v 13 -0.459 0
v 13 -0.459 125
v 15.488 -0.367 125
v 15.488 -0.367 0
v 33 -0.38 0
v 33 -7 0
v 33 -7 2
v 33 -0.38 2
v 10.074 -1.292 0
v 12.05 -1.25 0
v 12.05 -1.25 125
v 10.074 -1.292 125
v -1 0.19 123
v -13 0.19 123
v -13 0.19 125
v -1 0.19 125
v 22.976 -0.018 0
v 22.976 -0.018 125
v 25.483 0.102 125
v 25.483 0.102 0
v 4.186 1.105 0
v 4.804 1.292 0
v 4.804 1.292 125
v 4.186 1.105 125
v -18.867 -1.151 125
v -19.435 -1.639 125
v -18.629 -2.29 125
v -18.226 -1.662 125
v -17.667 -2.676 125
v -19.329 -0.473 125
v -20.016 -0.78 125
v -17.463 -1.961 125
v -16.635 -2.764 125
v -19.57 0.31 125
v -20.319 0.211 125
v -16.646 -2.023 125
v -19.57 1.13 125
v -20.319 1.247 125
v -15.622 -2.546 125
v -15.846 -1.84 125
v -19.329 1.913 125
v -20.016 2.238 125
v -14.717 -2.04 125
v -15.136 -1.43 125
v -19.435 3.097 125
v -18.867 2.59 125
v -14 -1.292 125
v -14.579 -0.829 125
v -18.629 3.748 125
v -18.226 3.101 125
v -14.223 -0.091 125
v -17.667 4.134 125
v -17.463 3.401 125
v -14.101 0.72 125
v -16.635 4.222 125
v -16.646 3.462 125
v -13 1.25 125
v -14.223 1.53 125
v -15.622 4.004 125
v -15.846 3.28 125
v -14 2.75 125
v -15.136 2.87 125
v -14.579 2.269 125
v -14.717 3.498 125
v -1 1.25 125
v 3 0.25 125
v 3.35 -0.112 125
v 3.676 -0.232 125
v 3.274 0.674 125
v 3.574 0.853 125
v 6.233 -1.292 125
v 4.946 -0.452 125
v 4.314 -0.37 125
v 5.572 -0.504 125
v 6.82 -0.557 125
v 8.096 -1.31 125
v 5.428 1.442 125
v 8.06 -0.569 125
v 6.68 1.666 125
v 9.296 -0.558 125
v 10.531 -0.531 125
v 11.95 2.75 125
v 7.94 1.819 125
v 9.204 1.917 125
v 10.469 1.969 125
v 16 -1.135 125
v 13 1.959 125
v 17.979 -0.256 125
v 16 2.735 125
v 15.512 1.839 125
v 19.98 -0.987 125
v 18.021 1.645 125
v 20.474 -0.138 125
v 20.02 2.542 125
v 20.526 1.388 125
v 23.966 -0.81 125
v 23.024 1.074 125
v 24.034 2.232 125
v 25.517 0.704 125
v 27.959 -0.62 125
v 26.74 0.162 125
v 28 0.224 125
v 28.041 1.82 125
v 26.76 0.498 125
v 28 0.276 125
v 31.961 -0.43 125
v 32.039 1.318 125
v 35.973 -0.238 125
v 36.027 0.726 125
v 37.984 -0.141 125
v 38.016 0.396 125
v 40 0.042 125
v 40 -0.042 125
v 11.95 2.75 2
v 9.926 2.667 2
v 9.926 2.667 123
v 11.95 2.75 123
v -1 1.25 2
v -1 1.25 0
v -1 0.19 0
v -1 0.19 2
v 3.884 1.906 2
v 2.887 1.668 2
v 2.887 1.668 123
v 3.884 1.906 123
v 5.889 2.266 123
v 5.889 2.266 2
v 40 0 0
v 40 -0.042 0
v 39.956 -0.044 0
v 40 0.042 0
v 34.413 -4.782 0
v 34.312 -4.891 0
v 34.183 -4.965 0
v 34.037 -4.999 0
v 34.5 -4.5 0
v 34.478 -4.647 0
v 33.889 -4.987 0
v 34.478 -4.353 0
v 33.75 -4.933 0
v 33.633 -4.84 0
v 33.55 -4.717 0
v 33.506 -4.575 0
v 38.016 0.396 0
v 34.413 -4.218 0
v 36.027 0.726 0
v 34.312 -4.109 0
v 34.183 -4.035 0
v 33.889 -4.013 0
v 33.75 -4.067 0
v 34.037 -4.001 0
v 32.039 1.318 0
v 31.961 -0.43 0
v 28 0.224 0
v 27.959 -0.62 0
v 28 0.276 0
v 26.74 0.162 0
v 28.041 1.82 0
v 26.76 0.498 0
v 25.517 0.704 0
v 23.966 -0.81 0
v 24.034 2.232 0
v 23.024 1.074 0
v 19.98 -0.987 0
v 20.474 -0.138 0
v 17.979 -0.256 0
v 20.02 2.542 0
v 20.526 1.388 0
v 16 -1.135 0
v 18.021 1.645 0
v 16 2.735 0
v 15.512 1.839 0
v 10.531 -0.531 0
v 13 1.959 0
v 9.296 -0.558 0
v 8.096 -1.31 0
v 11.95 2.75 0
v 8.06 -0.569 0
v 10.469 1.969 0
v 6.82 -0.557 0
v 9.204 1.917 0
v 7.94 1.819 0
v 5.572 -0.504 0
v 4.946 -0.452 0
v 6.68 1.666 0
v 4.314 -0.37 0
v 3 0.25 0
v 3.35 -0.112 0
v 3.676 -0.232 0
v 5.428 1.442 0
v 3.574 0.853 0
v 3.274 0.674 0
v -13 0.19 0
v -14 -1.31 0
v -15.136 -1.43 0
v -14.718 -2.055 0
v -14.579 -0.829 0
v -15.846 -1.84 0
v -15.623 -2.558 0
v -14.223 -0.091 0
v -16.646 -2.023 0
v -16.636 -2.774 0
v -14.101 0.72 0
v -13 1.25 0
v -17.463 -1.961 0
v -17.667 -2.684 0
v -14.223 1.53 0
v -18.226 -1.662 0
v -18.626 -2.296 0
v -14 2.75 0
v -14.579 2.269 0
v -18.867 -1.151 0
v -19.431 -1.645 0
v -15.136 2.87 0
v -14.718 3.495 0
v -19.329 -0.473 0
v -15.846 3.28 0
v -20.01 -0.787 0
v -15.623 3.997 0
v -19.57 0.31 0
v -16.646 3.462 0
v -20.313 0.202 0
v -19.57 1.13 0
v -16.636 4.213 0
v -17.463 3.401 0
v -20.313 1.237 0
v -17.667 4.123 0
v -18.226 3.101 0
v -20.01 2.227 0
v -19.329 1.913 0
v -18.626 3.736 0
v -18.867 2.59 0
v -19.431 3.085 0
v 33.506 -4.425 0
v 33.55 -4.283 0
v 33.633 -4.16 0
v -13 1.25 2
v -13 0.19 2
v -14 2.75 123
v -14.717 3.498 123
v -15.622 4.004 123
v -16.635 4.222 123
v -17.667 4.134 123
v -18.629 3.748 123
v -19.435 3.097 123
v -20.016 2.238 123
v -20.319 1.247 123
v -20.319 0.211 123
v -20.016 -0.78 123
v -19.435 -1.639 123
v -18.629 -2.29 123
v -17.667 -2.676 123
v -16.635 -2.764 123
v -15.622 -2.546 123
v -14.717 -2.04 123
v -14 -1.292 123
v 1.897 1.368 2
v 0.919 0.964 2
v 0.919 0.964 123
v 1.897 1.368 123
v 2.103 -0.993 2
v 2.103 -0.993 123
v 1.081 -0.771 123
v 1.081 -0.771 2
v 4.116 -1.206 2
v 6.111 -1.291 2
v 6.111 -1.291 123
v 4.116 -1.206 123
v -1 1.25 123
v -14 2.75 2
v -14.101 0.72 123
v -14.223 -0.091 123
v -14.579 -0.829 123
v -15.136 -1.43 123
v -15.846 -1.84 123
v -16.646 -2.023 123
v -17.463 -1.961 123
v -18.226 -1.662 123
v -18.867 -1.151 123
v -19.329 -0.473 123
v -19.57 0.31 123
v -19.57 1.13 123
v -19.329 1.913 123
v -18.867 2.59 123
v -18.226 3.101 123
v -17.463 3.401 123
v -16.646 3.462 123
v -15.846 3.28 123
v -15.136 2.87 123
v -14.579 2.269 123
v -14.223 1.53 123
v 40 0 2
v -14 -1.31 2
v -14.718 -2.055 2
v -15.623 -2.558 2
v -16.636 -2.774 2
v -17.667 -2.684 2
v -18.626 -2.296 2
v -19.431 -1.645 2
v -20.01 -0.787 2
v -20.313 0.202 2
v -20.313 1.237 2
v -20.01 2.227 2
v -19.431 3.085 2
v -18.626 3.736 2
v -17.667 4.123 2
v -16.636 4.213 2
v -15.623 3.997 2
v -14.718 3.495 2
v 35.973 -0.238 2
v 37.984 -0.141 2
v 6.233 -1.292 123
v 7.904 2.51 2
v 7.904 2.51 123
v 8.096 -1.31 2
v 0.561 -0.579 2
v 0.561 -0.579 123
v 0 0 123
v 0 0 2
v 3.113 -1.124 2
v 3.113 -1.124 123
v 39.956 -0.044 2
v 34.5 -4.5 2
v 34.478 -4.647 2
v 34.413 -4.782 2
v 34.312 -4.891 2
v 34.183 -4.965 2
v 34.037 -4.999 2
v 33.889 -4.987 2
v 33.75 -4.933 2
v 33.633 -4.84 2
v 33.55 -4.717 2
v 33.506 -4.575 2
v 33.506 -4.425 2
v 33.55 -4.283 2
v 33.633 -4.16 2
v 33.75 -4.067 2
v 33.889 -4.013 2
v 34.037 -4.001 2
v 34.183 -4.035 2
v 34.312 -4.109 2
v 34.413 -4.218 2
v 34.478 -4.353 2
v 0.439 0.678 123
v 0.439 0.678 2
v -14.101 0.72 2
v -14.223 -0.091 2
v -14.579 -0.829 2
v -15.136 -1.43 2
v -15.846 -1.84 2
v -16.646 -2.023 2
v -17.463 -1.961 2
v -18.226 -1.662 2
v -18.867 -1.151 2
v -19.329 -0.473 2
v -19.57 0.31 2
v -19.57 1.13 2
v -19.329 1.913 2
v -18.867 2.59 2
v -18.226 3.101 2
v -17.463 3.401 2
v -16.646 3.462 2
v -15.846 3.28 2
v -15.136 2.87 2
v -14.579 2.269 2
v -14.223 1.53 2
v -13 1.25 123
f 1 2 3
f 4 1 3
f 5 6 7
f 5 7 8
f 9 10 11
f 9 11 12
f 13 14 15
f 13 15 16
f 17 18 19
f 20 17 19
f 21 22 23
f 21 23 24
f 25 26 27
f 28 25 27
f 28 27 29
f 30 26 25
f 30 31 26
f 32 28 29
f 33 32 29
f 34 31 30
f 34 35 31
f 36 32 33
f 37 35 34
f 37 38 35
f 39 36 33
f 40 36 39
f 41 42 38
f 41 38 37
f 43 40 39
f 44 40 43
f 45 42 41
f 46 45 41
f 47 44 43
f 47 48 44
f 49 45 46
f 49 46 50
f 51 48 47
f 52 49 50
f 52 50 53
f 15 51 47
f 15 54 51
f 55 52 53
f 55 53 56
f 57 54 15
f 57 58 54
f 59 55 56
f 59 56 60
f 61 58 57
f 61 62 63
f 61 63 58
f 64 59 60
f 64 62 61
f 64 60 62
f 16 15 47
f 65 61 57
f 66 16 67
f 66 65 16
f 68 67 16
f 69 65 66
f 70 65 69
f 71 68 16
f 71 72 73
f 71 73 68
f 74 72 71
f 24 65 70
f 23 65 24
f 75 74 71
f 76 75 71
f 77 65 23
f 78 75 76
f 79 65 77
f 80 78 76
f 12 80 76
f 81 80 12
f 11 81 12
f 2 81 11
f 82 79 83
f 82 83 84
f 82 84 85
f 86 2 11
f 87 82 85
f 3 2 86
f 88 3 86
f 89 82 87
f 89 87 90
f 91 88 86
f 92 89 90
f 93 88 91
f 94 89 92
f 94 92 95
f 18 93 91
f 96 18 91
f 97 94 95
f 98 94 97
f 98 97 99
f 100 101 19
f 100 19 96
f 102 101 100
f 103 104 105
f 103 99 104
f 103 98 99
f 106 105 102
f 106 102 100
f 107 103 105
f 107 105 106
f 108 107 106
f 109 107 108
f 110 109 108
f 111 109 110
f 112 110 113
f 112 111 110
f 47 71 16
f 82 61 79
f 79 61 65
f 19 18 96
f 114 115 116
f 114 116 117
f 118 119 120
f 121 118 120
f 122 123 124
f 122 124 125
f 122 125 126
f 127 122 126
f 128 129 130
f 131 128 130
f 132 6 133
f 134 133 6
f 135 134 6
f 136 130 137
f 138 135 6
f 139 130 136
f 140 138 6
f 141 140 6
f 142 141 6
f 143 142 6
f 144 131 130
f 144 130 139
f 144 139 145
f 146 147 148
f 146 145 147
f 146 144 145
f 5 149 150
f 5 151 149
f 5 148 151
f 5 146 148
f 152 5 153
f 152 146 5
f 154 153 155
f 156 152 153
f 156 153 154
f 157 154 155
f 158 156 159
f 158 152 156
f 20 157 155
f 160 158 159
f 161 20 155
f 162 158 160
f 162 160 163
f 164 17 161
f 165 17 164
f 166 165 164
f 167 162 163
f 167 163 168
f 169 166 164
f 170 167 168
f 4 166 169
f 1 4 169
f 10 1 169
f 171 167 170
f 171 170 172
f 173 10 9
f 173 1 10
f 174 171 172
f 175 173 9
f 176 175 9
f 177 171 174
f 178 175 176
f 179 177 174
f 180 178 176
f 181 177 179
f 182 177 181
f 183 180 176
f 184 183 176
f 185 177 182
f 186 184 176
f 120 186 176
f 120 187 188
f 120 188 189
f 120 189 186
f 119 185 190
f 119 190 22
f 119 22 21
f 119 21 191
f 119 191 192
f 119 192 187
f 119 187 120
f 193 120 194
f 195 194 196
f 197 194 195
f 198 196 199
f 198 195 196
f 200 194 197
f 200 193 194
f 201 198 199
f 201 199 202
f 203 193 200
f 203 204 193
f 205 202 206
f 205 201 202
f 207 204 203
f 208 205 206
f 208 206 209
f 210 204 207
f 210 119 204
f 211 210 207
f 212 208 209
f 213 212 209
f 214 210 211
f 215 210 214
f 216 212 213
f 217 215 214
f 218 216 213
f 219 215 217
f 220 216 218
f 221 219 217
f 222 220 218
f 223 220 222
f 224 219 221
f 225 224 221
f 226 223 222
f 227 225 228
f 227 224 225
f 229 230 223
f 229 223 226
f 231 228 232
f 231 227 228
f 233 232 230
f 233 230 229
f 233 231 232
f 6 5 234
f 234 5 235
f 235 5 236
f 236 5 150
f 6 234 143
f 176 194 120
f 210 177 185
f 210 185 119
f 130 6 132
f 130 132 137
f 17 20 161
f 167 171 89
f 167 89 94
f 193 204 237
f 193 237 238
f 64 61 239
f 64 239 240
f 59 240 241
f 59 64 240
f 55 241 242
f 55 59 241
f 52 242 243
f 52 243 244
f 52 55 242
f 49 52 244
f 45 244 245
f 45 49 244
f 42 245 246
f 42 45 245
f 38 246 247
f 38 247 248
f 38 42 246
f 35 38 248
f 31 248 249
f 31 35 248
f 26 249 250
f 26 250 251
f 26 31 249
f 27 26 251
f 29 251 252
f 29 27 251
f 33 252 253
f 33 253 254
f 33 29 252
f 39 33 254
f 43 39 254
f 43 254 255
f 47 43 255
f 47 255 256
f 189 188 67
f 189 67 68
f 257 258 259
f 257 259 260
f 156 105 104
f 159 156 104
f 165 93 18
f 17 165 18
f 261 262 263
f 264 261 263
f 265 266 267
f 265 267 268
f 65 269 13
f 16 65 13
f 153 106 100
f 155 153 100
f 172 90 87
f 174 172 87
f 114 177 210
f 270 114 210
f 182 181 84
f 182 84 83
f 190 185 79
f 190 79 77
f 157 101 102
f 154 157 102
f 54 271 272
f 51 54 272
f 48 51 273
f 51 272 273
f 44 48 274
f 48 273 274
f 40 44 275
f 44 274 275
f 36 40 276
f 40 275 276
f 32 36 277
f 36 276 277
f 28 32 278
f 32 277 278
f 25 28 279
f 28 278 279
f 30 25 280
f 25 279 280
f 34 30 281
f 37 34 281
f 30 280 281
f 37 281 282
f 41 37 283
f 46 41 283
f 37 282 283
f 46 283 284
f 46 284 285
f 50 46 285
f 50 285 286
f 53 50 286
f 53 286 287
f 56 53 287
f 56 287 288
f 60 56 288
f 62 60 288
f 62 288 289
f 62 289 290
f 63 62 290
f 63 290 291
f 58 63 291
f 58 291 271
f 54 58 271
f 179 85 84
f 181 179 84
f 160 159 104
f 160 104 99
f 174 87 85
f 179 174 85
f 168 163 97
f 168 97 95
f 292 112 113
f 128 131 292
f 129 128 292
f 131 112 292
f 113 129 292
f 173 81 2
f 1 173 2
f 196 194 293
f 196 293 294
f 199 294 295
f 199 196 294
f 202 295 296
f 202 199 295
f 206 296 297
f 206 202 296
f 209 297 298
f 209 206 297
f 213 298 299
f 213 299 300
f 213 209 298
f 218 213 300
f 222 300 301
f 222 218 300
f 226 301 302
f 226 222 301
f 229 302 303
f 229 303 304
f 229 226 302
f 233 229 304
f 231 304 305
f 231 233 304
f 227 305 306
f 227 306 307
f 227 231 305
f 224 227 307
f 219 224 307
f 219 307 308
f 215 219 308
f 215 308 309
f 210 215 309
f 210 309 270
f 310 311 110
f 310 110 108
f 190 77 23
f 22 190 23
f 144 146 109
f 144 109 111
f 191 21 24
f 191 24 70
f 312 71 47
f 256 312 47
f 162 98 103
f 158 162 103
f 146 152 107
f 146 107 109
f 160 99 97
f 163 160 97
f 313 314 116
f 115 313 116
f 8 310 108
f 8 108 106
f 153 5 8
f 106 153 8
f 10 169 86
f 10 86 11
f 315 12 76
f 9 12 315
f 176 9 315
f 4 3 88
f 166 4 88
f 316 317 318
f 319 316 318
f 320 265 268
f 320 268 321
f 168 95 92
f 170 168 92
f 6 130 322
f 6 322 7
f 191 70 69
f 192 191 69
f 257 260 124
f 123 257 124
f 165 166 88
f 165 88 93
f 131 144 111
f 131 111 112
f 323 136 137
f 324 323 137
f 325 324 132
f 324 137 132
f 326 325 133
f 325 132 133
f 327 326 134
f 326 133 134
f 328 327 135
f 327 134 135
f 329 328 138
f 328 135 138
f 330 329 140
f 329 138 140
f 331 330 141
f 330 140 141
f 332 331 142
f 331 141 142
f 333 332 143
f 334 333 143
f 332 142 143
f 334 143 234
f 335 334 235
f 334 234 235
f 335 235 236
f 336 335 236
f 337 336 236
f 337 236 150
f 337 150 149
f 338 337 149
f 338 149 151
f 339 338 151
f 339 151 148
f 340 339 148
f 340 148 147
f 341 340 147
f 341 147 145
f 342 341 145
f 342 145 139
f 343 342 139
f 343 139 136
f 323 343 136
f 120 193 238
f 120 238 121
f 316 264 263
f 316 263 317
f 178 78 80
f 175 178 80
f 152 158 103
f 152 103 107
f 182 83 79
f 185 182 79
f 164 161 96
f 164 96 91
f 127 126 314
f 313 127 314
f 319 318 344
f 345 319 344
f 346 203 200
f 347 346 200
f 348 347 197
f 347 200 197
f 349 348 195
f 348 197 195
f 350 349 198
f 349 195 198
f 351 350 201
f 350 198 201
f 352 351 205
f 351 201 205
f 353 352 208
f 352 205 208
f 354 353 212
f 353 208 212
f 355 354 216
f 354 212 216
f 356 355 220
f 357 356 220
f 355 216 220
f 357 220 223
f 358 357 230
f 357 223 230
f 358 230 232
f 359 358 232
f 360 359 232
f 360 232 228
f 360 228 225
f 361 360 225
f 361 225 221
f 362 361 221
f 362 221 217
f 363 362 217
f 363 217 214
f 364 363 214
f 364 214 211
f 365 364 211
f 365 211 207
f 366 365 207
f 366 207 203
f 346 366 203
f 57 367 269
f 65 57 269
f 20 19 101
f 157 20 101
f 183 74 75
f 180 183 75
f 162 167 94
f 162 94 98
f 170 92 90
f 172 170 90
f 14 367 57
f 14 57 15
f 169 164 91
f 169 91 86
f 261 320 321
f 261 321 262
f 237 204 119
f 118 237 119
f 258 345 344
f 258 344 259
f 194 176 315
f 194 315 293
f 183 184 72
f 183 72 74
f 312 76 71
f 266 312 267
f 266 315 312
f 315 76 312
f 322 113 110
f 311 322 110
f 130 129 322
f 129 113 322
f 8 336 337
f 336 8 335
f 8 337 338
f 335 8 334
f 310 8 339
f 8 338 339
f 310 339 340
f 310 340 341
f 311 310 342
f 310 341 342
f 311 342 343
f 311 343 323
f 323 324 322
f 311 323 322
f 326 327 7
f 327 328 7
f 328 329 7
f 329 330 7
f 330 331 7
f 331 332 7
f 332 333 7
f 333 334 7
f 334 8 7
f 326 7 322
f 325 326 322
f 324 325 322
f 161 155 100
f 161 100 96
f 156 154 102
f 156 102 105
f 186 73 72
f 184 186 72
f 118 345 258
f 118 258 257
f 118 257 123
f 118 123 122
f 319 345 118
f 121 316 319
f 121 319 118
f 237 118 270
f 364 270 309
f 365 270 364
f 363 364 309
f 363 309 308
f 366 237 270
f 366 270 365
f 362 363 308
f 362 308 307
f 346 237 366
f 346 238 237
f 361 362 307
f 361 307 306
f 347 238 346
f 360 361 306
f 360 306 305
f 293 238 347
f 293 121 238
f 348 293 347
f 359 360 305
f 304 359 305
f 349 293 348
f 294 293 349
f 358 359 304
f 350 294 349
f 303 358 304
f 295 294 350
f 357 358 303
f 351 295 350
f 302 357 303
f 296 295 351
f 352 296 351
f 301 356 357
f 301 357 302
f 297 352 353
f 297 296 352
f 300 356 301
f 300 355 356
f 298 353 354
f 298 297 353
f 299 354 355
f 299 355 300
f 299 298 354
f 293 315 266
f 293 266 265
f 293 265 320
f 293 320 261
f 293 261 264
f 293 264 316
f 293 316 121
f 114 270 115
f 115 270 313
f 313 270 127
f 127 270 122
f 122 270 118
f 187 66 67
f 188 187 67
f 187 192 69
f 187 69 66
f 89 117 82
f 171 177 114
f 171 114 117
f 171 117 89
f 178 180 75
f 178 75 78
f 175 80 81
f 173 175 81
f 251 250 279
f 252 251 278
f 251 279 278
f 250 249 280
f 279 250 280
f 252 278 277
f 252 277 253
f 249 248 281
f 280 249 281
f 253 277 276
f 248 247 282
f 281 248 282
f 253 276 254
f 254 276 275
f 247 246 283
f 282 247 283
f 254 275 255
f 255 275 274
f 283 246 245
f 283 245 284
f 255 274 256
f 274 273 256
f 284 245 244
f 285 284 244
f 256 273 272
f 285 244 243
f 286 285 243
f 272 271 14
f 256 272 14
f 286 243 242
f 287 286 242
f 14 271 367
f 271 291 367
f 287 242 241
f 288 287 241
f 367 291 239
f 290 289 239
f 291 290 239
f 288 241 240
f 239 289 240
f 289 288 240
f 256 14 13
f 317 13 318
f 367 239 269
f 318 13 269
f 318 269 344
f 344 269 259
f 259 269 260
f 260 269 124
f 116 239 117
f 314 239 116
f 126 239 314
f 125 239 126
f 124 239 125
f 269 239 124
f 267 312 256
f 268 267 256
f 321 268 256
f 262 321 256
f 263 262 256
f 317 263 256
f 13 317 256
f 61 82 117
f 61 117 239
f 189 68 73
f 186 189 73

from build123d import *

# Parameters (mm, degrees)
PAD_DEPTH       = 125
PAD001_DEPTH    = 2
PAD002_DEPTH    = 2
SKETCH002_R     = 2.75
POCKET_DEPTH    = 125.001
POCKET001_DEPTH = 125.001
SKETCH004_W     = 12
SKETCH004_H     = 1.0604
POCKET002_DEPTH = 125.001
PAD003_DEPTH    = 2
SKETCH006_R     = 0.5
POCKET003_DEPTH = 125.001


with BuildPart() as part:
    # DWire → Pad (new body)
    with BuildSketch(Plane.XY):
        Polygon((38.0164, 0.396), (40, 0.042), (40, -0.042), (37.9836, -0.1408), (35.9732, -0.2376), (31.9612, -0.4296), (27.9592, -0.6204), (23.966, -0.8096), (19.9804, -0.9872), (16, -1.1348), (12.05, -1.25), (10.0744, -1.292), (8.0956, -1.3104), (6.1112, -1.2908), (4.116, -1.2064), (3.1132, -1.1236), (2.1032, -0.9928), (1.0812, -0.7708), (0.5608, -0.5792), (0, 0), (0.4392, 0.6776), (0.9188, 0.9644), (1.8968, 1.368), (2.8868, 1.6676), (3.884, 1.9064), (5.8888, 2.266), (7.9044, 2.5104), (9.9256, 2.6672), (11.95, 2.75), (16, 2.7348), (20.0196, 2.5424), (24.034, 2.232), (28.0408, 1.8204), (32.0388, 1.3184), (36.0268, 0.7264), align=None)
    extrude(amount=PAD_DEPTH)

    # Sketch → Pad001 (new body)
    with BuildSketch(Plane.XY.offset(125)):
        with BuildLine():
            Line((11.95, 2.75), (-14, 2.75))
            ThreePointArc((-14, 2.75), (-20.357544, 0.729), (-14, -1.292))
            Line((10.0744, -1.292), (-14, -1.292))
            Line((11.95, 2.75), (10.0744, -1.292))
        make_face()
    extrude(amount=-PAD001_DEPTH)

    # Sketch001 → Pad002 (new body)
    with BuildSketch(Plane(origin=(0, 0, 0), x_dir=(1, 0, 0), z_dir=(0, 0, -1))):
        with BuildLine():
            Line((8.0956, 1.3104), (11.95, -2.75))
            Line((11.95, -2.75), (-14, -2.75))
            ThreePointArc((-14, 1.3104), (-20.351015, -0.7198), (-14, -2.75))
            Line((8.0956, 1.3104), (-14, 1.3104))
        make_face()
    extrude(amount=-PAD002_DEPTH)

    # Sketch002 → Pocket (cut, through all)
    with BuildSketch(Plane(origin=(0, 0, 0), x_dir=(1, 0, 0), z_dir=(0, 0, -1))):
        with Locations((-16.851015, -0.7198)):
            Circle(SKETCH002_R)
    extrude(amount=-POCKET_DEPTH, mode=Mode.SUBTRACT)

    # Sketch003 → Pocket001 (cut, through all)
    with BuildSketch(Plane.XY.offset(125)):
        Polygon((28, 0.27625), (26.76025, 0.4975), (25.51675, 0.704), (23.02425, 1.074), (20.5255, 1.38775), (18.02125, 1.645), (15.51225, 1.839), (13, 1.95925), (10.46875, 1.96875), (9.2035, 1.917), (7.94025, 1.819), (6.6805, 1.66625), (5.4275, 1.4415), (4.80425, 1.29225), (4.1855, 1.105), (3.57425, 0.85275), (3.2745, 0.6735), (3, 0.25), (3.3505, -0.112), (3.67575, -0.23175), (4.3145, -0.3705), (4.94575, -0.45225), (5.5725, -0.504), (6.8195, -0.55675), (8.05975, -0.569), (9.2965, -0.5575), (10.53125, -0.53125), (13, -0.45925), (15.48775, -0.367), (17.97875, -0.256), (20.4745, -0.13775), (22.97575, -0.0185), (25.48325, 0.1015), (26.73975, 0.162), (28, 0.22375), align=None)
    extrude(amount=-POCKET001_DEPTH, mode=Mode.SUBTRACT)

    # Sketch004 → Pocket002 (cut, through all)
    with BuildSketch(Plane(origin=(0, 0, 0), x_dir=(1, 0, 0), z_dir=(0, 0, -1))):
        with Locations((-7, -0.7198)):
            Rectangle(SKETCH004_W, SKETCH004_H)
    extrude(amount=-POCKET002_DEPTH, mode=Mode.SUBTRACT)

    # Sketch005 → Pad003 (new body)
    with BuildSketch(Plane(origin=(0, 0, 0), x_dir=(1, 0, 0), z_dir=(0, 0, -1))):
        Polygon((33, 0), (40, 0), (33, 7), align=None)
    extrude(amount=-PAD003_DEPTH)

    # Sketch006 → Pocket003 (cut, through all)
    with BuildSketch(Plane(origin=(0, 0, 0), x_dir=(1, 0, 0), z_dir=(0, 0, -1))):
        with Locations((34, 4.5)):
            Circle(SKETCH006_R)
    extrude(amount=-POCKET003_DEPTH, mode=Mode.SUBTRACT)


solid = part.part
